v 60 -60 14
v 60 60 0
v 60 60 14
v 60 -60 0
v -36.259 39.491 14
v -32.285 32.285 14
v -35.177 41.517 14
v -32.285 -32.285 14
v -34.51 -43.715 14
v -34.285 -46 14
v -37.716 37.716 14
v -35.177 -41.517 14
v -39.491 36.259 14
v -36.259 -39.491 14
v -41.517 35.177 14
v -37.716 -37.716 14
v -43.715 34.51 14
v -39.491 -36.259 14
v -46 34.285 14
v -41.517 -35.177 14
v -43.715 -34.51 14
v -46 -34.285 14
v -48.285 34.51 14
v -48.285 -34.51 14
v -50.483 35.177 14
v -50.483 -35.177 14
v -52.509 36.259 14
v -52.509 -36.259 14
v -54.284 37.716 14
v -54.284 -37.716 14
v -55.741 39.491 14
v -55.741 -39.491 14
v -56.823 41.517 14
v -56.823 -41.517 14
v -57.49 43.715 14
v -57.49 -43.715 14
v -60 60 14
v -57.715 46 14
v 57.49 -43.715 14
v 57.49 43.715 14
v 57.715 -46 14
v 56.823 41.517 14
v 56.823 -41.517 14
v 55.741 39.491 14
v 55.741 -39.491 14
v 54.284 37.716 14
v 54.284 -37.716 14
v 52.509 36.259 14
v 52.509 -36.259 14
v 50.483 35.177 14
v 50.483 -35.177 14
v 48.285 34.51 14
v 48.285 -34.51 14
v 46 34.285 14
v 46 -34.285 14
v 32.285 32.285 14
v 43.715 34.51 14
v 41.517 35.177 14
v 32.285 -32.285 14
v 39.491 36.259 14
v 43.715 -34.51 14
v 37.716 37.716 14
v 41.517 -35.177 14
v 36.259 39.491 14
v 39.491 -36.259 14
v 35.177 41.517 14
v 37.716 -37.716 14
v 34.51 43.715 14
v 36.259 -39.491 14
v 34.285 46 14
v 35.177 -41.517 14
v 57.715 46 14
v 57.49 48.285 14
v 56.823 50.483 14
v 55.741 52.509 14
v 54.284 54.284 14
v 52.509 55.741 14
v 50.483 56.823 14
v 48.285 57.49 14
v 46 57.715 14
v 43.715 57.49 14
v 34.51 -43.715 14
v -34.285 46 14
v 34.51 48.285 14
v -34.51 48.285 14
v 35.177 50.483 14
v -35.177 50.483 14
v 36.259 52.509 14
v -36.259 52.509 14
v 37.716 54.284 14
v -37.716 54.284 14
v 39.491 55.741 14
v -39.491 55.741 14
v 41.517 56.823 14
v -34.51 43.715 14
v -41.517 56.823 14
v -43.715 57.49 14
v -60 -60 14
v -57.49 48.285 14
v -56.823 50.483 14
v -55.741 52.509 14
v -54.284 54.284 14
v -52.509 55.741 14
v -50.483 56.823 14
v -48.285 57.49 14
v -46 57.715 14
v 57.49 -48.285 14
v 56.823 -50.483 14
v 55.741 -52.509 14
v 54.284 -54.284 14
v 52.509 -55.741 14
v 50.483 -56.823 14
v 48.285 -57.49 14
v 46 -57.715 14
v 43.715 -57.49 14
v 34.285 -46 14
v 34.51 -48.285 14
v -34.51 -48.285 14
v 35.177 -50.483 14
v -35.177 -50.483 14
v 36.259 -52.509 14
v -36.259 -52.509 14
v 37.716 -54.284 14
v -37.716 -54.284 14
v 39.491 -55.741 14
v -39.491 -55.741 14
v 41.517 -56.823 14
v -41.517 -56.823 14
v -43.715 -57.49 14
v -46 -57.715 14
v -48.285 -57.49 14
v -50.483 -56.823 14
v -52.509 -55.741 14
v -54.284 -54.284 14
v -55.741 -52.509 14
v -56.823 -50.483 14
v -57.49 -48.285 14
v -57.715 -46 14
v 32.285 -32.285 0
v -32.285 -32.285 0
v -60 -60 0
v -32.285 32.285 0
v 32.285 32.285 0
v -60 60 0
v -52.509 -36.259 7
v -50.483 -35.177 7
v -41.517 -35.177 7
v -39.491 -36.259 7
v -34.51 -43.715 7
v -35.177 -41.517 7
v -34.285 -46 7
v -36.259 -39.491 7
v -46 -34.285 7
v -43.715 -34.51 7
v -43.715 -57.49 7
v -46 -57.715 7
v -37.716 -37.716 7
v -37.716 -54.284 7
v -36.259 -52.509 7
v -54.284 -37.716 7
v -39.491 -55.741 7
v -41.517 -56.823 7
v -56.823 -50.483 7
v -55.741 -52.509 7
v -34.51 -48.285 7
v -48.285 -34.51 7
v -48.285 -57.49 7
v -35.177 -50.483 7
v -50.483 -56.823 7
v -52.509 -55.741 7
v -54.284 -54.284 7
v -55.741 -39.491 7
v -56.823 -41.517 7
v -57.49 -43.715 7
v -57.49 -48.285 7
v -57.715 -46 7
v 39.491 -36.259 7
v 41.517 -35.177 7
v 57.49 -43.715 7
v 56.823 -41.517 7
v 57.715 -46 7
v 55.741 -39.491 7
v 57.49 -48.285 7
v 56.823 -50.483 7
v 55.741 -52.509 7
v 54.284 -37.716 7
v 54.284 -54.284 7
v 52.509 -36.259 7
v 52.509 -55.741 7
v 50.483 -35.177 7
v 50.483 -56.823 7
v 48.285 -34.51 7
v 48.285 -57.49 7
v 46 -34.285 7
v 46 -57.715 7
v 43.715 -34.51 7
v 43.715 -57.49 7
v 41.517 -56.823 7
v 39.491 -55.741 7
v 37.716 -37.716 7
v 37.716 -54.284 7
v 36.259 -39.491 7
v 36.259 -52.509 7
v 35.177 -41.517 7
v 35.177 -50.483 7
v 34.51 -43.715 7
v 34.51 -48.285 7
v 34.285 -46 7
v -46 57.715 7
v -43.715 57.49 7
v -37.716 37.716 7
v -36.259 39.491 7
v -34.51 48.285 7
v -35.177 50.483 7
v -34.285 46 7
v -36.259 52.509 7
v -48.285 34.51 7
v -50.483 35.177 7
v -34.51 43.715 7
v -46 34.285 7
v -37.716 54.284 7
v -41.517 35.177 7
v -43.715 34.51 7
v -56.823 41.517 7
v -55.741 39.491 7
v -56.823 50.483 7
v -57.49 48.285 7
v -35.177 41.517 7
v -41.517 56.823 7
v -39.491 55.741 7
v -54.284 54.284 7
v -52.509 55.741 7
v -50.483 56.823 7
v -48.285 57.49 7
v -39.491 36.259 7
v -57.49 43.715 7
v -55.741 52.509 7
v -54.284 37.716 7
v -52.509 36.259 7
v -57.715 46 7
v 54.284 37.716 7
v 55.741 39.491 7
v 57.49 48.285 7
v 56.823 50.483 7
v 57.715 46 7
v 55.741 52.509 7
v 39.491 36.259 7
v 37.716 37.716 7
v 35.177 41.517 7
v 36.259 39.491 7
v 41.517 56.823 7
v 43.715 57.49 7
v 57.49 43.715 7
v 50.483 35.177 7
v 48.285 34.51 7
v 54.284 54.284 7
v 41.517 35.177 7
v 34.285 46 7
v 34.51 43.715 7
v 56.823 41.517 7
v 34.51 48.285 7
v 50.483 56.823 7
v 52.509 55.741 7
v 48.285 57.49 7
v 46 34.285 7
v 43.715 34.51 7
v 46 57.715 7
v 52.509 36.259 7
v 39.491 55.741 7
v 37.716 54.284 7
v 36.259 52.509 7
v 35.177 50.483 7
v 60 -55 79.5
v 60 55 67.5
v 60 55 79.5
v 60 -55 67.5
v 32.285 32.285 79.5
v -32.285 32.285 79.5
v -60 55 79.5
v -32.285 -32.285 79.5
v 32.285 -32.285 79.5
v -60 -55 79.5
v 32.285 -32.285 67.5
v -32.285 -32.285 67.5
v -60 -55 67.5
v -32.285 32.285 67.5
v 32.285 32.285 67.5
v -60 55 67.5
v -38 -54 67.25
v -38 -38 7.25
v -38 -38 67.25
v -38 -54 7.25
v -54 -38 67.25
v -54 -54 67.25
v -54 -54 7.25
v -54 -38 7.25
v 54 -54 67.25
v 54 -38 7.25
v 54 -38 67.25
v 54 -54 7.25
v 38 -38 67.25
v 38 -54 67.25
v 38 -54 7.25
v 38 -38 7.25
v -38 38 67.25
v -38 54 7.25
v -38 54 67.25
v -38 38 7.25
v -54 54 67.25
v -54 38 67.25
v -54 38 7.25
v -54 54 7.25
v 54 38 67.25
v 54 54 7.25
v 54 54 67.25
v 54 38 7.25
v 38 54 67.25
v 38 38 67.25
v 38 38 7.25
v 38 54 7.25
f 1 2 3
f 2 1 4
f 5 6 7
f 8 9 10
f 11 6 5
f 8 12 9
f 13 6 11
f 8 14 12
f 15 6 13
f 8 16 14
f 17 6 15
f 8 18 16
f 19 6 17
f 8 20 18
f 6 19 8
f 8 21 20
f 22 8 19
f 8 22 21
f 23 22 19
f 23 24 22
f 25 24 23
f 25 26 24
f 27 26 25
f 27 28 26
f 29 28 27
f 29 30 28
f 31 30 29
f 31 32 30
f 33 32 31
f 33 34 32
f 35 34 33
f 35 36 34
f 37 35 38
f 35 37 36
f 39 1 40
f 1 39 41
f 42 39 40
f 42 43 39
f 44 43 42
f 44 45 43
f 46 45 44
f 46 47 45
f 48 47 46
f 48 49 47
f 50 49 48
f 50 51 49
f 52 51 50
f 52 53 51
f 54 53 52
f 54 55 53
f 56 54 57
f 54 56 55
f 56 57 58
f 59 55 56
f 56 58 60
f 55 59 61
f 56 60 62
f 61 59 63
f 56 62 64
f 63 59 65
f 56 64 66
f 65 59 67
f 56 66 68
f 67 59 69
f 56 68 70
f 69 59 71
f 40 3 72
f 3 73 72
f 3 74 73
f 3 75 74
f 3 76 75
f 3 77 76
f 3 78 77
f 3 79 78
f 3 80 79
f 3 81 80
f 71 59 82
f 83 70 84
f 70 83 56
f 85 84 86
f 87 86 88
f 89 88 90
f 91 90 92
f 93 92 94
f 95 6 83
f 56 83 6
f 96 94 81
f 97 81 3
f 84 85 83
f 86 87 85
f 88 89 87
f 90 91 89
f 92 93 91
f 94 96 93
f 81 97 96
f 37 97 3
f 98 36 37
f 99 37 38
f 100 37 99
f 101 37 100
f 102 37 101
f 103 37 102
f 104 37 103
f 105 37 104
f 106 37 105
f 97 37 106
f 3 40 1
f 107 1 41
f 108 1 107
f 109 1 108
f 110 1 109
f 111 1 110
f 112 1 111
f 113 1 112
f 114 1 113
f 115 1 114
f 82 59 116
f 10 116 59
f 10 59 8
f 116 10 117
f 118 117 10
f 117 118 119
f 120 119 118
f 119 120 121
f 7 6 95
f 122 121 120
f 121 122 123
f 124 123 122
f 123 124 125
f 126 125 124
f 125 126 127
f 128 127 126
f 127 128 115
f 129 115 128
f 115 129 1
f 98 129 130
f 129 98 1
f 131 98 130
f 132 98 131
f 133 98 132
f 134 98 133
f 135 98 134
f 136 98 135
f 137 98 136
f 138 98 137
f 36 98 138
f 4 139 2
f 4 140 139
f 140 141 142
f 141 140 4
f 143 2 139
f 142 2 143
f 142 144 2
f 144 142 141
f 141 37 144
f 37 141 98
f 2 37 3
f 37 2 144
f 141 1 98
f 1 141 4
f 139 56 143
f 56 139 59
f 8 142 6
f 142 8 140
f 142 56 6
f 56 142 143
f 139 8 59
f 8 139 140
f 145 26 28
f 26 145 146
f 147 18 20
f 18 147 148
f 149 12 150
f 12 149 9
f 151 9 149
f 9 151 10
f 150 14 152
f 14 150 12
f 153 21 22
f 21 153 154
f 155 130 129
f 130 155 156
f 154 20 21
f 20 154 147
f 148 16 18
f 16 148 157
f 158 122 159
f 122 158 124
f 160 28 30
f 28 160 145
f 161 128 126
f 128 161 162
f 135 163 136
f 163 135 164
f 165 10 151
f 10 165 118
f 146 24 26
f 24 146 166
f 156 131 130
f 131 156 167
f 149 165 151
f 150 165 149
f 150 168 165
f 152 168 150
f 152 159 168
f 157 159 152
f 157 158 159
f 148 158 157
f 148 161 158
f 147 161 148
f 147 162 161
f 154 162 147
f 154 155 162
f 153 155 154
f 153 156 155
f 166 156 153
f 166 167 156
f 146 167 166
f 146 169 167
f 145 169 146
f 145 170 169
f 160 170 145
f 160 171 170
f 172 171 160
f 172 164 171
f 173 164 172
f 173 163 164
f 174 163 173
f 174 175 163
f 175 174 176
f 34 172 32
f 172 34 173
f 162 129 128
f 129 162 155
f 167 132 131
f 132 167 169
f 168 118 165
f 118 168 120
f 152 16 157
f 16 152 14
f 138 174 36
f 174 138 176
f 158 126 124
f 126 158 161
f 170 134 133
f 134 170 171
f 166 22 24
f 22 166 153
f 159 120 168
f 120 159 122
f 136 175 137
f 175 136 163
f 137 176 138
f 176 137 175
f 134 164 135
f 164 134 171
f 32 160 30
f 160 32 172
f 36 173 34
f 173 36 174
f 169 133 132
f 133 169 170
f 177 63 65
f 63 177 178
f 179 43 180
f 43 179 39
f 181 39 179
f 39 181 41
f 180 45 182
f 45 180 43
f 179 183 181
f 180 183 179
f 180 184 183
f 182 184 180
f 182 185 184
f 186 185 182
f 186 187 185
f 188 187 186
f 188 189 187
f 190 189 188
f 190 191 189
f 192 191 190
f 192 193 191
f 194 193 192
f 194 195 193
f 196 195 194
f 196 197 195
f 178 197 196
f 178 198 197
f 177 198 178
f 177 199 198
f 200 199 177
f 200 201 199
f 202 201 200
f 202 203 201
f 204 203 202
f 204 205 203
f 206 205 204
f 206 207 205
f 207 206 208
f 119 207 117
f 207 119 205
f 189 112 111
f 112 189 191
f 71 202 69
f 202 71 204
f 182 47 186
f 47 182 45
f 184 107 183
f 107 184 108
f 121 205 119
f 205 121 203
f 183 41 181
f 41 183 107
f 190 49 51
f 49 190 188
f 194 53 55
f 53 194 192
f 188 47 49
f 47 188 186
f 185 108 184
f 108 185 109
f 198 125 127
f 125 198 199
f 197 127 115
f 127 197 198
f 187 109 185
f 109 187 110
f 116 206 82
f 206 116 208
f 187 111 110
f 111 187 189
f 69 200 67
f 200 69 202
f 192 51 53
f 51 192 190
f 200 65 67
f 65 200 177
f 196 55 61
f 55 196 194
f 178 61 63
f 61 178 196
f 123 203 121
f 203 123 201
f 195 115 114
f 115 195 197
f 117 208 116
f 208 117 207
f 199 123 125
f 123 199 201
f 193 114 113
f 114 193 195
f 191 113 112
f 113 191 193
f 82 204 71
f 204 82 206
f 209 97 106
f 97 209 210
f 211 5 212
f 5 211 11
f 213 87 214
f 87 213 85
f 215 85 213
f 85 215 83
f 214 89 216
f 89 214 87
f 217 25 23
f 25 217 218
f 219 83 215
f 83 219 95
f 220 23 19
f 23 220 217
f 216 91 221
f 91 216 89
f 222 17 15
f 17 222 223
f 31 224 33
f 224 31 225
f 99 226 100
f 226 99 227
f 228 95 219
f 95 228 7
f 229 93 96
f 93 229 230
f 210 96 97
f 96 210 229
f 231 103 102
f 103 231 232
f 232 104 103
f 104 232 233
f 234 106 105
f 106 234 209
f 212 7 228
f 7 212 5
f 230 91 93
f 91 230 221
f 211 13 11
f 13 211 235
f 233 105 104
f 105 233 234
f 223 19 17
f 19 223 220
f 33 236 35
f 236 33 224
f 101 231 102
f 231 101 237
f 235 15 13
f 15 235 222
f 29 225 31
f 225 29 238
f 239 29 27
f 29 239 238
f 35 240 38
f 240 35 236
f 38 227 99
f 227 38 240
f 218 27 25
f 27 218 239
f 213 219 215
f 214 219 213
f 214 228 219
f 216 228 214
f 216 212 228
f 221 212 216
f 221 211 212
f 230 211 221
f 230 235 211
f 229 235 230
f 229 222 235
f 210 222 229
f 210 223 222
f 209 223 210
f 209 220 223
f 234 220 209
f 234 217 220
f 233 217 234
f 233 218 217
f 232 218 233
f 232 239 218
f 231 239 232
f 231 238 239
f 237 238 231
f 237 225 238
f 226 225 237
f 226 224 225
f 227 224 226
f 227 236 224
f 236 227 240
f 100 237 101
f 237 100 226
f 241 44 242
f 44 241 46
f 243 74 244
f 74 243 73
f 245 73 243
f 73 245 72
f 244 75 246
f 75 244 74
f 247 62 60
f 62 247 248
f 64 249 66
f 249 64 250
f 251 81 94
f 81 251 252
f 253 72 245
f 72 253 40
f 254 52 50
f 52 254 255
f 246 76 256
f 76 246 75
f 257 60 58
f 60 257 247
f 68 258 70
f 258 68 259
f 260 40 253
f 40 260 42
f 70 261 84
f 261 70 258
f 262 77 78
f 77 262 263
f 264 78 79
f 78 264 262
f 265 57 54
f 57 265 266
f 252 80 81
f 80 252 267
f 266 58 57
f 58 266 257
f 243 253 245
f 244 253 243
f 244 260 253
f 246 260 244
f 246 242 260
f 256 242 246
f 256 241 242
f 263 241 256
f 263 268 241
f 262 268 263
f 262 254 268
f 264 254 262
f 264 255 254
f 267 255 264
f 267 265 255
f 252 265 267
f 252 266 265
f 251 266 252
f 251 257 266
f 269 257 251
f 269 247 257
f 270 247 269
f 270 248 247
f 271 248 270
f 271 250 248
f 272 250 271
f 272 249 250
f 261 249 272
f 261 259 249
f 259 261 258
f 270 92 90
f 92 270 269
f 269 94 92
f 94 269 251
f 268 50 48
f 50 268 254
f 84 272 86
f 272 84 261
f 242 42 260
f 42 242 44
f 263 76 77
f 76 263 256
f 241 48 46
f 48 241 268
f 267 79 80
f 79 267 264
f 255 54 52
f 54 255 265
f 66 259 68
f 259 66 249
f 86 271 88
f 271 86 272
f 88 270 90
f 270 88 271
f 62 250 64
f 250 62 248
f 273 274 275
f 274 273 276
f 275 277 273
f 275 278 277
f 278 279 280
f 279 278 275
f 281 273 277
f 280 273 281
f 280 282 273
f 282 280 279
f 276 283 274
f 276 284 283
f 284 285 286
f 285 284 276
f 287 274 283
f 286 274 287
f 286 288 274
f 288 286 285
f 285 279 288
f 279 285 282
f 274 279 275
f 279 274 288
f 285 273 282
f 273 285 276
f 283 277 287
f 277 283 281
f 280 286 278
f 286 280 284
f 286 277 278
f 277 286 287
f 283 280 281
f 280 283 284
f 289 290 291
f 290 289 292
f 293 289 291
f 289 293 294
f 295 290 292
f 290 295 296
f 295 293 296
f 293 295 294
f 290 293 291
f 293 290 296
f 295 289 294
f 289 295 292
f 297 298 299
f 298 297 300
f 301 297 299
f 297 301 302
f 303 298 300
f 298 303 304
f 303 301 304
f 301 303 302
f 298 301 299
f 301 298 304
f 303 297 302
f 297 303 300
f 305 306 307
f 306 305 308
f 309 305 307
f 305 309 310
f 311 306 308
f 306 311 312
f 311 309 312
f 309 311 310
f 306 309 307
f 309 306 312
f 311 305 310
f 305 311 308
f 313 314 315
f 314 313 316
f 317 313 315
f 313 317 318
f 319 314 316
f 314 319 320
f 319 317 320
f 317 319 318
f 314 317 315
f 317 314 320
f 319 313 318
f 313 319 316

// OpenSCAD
$fn = 32;

// ------------------------------------------------------------------------
// Frame cube: base 120 x 120 mm, posts 60 mm tall
// Every part is its own module, assembly() places every instance.
// ------------------------------------------------------------------------

// --- part 1 ---
module base_frame() {
  difference() {
    translate([-60, -60, 0]) cube([120, 120, 14]);
    translate([-32.285, -32.285, -1]) cube([64.57, 64.57, 16]);
    translate([-46, -46, 7]) cylinder(h = 8, d = 23.43);
    translate([46, -46, 7]) cylinder(h = 8, d = 23.43);
    translate([-46, 46, 7]) cylinder(h = 8, d = 23.43);
    translate([46, 46, 7]) cylinder(h = 8, d = 23.43);
  }
}

// --- part 2 ---
module corner_post() {
  translate([-8, -8, 0]) cube([16, 16, 60]);
}

// --- part 3 ---
module top_frame() {
  difference() {
    translate([-60, -55, 0]) cube([120, 110, 12]);
    translate([-32.285, -32.285, -1]) cube([64.57, 64.57, 14]);
  }
}

// --- assembly ---
module assembly() {
  color([0.80, 0.24, 0.20]) translate([0, 0, 0]) rotate([0, 0, 0]) base_frame();
  color([0.20, 0.45, 0.75]) translate([-46, -46, 7.25]) rotate([0, 0, 0]) corner_post();
  color([0.25, 0.62, 0.32]) translate([46, -46, 7.25]) rotate([0, 0, 0]) corner_post();
  color([0.92, 0.70, 0.18]) translate([-46, 46, 7.25]) rotate([0, 0, 0]) corner_post();
  color([0.58, 0.35, 0.70]) translate([46, 46, 7.25]) rotate([0, 0, 0]) corner_post();
  color([0.16, 0.66, 0.66]) translate([0, 0, 67.5]) rotate([0, 0, 0]) top_frame();
}

assembly();
